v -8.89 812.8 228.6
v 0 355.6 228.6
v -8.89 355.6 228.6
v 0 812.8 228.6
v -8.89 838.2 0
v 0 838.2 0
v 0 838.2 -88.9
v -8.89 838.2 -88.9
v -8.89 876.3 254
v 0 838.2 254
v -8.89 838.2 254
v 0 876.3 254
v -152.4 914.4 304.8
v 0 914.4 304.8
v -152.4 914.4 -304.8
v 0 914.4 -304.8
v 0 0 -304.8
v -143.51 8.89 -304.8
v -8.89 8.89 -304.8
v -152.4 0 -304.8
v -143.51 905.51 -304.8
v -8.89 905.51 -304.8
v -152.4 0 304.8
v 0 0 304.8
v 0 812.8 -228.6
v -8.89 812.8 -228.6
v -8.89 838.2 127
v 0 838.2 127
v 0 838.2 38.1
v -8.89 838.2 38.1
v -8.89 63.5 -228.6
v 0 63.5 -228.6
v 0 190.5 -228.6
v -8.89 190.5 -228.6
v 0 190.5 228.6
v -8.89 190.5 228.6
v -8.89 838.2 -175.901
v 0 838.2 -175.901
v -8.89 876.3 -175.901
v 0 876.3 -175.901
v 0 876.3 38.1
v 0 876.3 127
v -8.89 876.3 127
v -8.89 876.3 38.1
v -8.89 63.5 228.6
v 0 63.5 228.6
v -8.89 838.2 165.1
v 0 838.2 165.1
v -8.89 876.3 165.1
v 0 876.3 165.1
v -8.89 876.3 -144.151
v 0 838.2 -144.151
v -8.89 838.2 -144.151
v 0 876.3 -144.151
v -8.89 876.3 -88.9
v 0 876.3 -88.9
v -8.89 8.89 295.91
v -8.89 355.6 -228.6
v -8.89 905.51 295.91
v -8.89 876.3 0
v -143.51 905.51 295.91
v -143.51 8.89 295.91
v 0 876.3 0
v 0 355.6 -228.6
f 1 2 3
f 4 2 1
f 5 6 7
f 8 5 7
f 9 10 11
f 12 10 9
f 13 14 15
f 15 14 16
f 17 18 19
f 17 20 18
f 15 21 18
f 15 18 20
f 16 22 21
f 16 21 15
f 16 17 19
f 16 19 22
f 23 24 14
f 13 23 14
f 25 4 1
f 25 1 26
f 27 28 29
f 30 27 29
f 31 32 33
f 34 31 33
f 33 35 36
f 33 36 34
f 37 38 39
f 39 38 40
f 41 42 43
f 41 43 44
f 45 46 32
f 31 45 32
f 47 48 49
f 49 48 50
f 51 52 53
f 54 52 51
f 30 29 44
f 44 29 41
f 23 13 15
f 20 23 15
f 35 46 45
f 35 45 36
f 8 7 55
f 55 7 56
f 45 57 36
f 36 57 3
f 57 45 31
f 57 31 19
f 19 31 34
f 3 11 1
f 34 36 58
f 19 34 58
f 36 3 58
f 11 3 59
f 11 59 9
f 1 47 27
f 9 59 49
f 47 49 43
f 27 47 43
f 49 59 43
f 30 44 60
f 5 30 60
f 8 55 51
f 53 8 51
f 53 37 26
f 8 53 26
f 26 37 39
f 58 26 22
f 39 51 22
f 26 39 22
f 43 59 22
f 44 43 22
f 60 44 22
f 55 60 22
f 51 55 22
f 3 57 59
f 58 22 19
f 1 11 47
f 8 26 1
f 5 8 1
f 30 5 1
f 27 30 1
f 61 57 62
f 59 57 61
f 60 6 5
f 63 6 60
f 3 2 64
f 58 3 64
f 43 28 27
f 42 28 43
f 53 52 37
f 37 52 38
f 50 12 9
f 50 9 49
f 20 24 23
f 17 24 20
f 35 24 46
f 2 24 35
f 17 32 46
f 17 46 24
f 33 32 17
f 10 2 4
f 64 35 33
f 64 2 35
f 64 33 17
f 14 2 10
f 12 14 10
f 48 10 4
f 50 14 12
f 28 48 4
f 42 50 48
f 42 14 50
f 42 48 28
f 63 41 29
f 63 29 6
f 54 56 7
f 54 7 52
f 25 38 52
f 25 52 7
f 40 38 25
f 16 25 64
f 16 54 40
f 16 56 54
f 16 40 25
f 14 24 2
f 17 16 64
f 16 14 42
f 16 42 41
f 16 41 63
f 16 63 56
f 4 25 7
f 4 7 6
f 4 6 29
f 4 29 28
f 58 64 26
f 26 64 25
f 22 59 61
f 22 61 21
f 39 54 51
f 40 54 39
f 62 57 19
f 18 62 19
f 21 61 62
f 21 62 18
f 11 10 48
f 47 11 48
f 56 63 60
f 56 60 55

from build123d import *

# Parameters (mm, degrees)
SKETCH1_W            = 609.6
SKETCH1_H            = 914.4
OUTERBODIE_DEPTH     = 152.4
SHELL1_T             = -8.89
SKETCH3_W            = 457.2
SKETCH3_H            = 127
WIRE_DUCT_DEPTH      = 8.89
SKETCH2_W            = 457.2
SKETCH2_H            = 457.2
DISPLAY_CUTOUT_DEPTH = 8.89
SKETCH5_W            = 88.9
SKETCH5_H            = 38.1
SKETCH5_W_2          = 31.75
GAME_DISPLAY_DEPTH   = 8.89


with BuildPart() as part:
    # Sketch1 → OuterBodie (new body)
    with BuildSketch(Plane(origin=(0, 0, 0), x_dir=(0, 0, -1), z_dir=(1, 0, 0))):
        with Locations((0, 457.2)):
            Rectangle(SKETCH1_W, SKETCH1_H)
    extrude(amount=-OUTERBODIE_DEPTH)

    # Shell1
    shell1_openings = [part.faces().sort_by_distance(p)[0] for p in [
        (-76.2, 457.2, -304.8),
    ]]
    offset(amount=SHELL1_T, openings=shell1_openings, kind=Kind.INTERSECTION)

    # Sketch3 → Wire duct (cut)
    with BuildSketch(Plane(origin=(0, 0, 0), x_dir=(0, 0, -1), z_dir=(1, 0, 0))):
        with Locations((0, 127)):
            Rectangle(SKETCH3_W, SKETCH3_H)
    extrude(amount=-WIRE_DUCT_DEPTH, mode=Mode.SUBTRACT)

    # Sketch2 → Display cutout (cut)
    with BuildSketch(Plane(origin=(0, 0, 0), x_dir=(0, 0, -1), z_dir=(1, 0, 0))):
        with Locations((0, 584.2)):
            Rectangle(SKETCH2_W, SKETCH2_H)
    extrude(amount=-DISPLAY_CUTOUT_DEPTH, mode=Mode.SUBTRACT)

    # Sketch5 → Game Display (cut)
    with BuildSketch(Plane(origin=(0, 0, 0), x_dir=(0, 0, -1), z_dir=(1, 0, 0))):
        with Locations((-209.55, 857.25)):
            Rectangle(SKETCH5_W, SKETCH5_H)
        with Locations((-82.55, 857.25)):
            Rectangle(SKETCH5_W, SKETCH5_H)
        with Locations((44.45, 857.25)):
            Rectangle(SKETCH5_W, SKETCH5_H)
        with Locations((160.026262688, 857.25)):
            Rectangle(SKETCH5_W_2, SKETCH5_H)
    extrude(amount=-GAME_DISPLAY_DEPTH, mode=Mode.SUBTRACT)


solid = part.part
